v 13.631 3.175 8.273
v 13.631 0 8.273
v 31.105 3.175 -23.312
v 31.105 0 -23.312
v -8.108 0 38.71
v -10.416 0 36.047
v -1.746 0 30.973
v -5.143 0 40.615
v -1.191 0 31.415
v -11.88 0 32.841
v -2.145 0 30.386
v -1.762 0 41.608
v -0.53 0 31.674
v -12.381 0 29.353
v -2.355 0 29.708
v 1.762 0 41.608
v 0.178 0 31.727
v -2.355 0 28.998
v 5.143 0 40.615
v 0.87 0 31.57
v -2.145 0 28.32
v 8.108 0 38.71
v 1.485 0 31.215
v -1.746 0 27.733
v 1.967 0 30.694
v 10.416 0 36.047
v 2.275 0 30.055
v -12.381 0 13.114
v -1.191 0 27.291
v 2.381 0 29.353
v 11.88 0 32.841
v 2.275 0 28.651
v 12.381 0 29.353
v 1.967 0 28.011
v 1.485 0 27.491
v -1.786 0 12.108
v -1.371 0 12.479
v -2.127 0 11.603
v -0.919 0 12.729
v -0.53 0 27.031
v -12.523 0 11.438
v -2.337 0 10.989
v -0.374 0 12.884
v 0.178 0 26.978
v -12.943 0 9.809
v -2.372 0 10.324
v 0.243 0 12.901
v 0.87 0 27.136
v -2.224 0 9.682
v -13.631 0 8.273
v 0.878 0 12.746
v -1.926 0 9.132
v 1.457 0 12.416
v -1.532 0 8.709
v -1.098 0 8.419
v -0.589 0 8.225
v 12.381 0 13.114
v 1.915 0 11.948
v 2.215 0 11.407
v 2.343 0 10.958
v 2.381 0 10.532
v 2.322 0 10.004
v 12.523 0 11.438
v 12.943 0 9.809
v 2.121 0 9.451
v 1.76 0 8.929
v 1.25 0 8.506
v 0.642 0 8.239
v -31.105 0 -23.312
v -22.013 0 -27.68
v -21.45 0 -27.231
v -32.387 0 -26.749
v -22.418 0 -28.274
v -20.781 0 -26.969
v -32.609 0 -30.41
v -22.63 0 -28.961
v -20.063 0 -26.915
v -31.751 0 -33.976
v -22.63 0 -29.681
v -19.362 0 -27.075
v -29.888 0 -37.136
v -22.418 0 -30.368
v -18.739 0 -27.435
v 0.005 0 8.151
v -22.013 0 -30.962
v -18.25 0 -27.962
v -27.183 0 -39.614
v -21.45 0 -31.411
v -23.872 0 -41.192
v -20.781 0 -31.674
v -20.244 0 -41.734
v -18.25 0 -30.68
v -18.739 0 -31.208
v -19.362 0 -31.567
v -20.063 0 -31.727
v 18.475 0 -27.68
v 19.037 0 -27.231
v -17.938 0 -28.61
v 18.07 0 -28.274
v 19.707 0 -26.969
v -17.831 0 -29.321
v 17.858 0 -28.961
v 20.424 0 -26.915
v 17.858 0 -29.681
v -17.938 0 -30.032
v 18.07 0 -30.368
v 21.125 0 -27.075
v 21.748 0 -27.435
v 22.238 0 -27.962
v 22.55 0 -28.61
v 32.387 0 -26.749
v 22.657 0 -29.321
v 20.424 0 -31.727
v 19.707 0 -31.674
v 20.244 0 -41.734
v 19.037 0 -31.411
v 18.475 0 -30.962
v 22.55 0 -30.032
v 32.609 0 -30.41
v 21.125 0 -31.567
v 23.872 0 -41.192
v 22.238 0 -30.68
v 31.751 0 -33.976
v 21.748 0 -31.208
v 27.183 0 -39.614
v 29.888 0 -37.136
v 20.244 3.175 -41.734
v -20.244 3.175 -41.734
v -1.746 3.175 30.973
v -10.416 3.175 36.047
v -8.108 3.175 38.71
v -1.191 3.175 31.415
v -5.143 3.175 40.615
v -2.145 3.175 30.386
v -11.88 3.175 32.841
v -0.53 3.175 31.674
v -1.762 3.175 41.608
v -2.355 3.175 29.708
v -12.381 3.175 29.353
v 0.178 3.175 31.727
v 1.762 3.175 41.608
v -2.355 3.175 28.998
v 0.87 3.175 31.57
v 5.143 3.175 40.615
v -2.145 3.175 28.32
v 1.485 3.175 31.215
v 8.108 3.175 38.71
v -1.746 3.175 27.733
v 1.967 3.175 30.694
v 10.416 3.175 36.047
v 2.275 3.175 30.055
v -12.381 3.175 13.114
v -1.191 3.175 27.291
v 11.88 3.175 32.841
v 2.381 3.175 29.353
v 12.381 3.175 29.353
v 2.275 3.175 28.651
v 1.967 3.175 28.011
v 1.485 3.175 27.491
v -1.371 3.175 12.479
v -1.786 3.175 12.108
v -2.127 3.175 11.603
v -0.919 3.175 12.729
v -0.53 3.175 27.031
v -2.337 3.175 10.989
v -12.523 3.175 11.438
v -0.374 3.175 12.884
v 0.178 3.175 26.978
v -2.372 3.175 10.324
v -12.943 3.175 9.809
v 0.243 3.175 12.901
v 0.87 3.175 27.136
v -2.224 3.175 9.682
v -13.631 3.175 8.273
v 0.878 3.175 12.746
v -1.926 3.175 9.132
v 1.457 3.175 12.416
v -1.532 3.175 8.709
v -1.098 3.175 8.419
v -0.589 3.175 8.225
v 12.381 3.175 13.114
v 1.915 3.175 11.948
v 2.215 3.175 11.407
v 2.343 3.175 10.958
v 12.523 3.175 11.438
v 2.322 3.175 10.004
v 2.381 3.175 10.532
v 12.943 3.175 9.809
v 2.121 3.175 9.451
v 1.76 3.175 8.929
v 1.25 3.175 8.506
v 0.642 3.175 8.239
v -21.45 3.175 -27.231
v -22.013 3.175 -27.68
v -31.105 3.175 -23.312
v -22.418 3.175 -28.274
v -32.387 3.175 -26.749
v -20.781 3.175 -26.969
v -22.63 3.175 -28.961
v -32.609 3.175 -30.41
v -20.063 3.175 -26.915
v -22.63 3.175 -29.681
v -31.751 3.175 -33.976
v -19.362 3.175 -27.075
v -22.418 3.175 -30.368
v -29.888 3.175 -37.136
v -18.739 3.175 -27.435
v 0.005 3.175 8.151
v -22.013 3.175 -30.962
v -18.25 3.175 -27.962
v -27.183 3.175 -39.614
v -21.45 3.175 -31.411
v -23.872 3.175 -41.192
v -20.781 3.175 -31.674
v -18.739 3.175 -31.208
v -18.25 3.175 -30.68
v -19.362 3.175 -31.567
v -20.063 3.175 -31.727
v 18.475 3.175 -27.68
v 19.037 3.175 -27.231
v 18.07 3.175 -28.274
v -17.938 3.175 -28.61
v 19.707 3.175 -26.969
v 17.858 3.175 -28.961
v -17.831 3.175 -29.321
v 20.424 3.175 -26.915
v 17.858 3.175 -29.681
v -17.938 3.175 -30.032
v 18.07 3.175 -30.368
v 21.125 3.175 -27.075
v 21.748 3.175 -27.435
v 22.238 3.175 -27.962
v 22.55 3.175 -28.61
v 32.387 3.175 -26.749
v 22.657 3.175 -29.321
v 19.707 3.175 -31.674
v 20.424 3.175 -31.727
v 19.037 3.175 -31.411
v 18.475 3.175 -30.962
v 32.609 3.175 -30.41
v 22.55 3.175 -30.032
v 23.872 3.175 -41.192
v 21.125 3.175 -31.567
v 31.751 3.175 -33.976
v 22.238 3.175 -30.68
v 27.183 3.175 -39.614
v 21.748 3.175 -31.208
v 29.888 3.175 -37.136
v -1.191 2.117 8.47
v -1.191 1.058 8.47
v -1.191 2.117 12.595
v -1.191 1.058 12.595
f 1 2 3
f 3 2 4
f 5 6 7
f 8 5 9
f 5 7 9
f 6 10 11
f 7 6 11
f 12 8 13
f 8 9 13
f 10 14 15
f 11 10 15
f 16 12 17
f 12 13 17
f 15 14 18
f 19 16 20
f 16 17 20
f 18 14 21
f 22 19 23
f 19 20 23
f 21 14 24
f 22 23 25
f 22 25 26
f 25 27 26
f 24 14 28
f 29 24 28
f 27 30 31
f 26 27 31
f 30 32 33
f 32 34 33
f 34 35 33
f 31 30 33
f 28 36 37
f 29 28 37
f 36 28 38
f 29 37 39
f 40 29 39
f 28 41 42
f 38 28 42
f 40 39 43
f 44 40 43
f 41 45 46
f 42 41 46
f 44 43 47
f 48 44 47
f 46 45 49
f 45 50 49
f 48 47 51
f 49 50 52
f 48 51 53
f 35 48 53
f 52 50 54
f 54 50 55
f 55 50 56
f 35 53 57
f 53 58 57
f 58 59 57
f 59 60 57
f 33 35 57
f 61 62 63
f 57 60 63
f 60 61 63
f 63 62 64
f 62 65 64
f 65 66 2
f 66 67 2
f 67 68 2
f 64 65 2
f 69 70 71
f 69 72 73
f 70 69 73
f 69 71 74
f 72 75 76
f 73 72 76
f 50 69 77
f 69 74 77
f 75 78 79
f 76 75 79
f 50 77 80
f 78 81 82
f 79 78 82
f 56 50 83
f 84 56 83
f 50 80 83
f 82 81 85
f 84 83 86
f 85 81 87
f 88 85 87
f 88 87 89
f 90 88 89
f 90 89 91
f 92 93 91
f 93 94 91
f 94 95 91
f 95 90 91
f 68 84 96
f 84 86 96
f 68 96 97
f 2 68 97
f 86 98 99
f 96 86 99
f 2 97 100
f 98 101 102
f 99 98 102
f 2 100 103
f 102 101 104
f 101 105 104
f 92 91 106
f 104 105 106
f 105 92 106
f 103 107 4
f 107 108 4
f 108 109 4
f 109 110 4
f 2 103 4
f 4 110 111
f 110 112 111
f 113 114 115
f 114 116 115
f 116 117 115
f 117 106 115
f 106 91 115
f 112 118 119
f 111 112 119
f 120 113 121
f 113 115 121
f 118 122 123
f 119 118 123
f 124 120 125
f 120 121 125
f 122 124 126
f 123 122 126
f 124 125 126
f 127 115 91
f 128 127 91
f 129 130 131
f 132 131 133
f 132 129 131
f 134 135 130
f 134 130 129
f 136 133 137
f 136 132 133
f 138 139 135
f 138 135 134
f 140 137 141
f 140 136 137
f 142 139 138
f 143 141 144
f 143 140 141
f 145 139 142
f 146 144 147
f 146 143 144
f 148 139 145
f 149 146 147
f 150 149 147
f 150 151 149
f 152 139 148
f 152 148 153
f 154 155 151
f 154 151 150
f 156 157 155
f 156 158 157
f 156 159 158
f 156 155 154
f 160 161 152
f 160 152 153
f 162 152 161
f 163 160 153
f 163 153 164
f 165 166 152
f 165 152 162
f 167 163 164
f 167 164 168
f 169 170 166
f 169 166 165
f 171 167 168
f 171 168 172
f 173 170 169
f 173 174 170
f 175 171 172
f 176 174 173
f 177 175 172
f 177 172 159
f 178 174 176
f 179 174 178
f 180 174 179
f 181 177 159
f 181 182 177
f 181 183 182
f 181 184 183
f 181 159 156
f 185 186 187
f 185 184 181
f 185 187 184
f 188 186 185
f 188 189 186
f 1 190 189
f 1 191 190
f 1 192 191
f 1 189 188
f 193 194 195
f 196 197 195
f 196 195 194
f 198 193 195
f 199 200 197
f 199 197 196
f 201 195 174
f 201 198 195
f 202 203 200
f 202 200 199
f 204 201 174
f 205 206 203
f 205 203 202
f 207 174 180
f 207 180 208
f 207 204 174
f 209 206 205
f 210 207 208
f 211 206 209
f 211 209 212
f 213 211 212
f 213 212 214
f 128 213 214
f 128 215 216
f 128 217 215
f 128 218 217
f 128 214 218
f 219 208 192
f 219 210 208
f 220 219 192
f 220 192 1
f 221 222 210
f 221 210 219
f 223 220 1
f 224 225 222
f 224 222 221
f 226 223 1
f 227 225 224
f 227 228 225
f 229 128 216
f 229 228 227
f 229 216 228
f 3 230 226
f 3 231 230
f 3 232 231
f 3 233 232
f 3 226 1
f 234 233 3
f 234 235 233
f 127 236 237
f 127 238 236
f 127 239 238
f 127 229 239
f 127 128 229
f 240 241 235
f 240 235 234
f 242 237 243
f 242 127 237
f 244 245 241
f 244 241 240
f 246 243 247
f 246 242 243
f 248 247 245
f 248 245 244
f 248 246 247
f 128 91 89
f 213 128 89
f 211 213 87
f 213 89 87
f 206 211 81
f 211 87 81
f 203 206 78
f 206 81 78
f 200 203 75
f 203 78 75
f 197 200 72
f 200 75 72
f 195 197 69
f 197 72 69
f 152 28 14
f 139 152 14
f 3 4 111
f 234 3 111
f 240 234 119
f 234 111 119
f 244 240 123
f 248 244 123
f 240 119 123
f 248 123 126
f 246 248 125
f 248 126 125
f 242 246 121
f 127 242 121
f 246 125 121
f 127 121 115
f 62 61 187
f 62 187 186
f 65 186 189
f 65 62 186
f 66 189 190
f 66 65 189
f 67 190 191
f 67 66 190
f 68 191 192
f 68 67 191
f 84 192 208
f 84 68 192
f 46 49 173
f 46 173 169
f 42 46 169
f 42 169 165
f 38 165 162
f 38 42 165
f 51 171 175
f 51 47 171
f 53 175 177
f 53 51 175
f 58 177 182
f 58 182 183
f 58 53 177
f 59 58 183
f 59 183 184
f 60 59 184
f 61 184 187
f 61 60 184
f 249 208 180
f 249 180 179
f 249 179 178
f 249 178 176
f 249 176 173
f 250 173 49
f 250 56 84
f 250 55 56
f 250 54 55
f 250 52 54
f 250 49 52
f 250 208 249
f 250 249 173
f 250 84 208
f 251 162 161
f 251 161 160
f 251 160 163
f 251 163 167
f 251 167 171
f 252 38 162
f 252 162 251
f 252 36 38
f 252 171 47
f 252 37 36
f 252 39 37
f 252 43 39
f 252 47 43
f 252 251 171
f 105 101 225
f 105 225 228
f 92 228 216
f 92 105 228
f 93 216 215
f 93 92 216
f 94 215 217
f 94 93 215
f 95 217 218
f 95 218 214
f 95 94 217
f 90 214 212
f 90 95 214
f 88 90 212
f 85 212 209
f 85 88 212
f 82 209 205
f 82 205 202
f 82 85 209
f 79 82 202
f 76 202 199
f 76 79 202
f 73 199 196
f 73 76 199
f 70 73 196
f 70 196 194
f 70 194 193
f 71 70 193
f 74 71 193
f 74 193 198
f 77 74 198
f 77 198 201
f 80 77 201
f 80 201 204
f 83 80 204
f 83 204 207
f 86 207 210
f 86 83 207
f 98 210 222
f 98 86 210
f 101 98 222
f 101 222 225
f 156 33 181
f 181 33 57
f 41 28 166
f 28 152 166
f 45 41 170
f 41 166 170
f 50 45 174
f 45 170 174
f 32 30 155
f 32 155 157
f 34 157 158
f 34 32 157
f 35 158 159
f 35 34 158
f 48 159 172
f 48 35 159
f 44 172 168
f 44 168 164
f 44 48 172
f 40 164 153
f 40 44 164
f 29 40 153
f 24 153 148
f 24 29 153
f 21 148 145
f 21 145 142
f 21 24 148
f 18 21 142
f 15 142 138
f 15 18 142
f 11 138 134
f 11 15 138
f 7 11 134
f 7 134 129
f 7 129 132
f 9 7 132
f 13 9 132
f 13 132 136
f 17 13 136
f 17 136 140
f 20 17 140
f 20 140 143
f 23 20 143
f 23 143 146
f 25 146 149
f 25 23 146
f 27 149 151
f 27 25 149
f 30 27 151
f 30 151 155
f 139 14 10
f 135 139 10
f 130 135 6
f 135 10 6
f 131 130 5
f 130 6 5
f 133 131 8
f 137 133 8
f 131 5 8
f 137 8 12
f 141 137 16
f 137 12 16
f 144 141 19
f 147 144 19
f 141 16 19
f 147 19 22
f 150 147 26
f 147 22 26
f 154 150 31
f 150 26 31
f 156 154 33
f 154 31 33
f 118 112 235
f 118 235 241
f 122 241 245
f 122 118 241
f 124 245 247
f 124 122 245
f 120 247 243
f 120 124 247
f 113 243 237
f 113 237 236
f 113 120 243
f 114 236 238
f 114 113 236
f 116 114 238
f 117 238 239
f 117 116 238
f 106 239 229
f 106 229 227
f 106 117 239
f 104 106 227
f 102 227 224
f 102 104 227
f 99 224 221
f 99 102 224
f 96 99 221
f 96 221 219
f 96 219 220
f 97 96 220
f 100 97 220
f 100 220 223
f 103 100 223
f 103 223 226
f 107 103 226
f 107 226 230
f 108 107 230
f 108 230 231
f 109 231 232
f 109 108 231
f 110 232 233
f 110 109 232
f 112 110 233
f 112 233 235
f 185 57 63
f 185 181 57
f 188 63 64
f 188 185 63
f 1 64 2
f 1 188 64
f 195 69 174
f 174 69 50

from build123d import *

# Parameters (mm, degrees)
SKETCH1_R           = 2.38125
SKETCH1_R_2         = 12.413
SKETCH1_R_3         = 2.413
BOSS_EXTRUDE1_DEPTH = 3.175
FILLET1_R           = 10


with BuildPart() as part:
    # Sketch1 → Boss-Extrude1 (new body)
    with BuildSketch(Plane(origin=(0, 0, 0), x_dir=(1, 0, 0), z_dir=(0, 1, 0))):
        with BuildLine():
            ThreePointArc((-8.046041628, -19.942425209), (-11.245341357, -24.172368354), (-12.38125, -29.352875022))
            ThreePointArc((-12.38125, -29.352875022), (0, -41.734125022), (12.38125, -29.352875022))
            ThreePointArc((12.38125, -29.352875022), (11.245341357, -24.172368354), (8.046041628, -19.942425209))
            add(Edge.make_bspline(
                [(-8.046041628, -19.942425209), (-7.058484548, -20.785974262), (-4.539606647, -22.332996604), (0, -23.235965205), (4.539606647, -22.332996604), (7.058484548, -20.785974262), (8.046041628, -19.942425209)],
                knots=[4.00497242, 4.00497242, 4.00497242, 4.00497242, 4.319689899, 4.71238898, 5.105088062, 5.419805541, 5.419805541, 5.419805541, 5.419805541], degree=3))
        make_face()
        with Locations((0, -29.352875022)):
            Circle(SKETCH1_R, mode=Mode.SUBTRACT)
        with BuildLine():
            Line((-12.38125, -10.532423695), (-12.38125, -29.352875022))
            ThreePointArc((-12.38125, -29.352875022), (-11.245341357, -24.172368354), (-8.046041628, -19.942425209))
            add(Edge.make_bspline(
                [(-12.38125, -10.532423695), (-12.38125, -10.937602676), (-12.301779915, -12.5583186), (-11.507079063, -15.737360854), (-9.718393414, -18.414272732), (-8.290741365, -19.733408195), (-8.046041628, -19.942425209)],
                knots=[3.141592654, 3.141592654, 3.141592654, 3.141592654, 3.239767424, 3.534291735, 3.926990817, 4.00497242, 4.00497242, 4.00497242, 4.00497242], degree=3))
        make_face()
        with BuildLine():
            ThreePointArc((8.046041628, -19.942425209), (0, -16.971625022), (-8.046041628, -19.942425209))
            add(Edge.make_bspline(
                [(-8.046041628, -19.942425209), (-7.058484548, -20.785974262), (-4.539606647, -22.332996604), (0, -23.235965205), (4.539606647, -22.332996604), (7.058484548, -20.785974262), (8.046041628, -19.942425209)],
                knots=[4.00497242, 4.00497242, 4.00497242, 4.00497242, 4.319689899, 4.71238898, 5.105088062, 5.419805541, 5.419805541, 5.419805541, 5.419805541], degree=3))
        make_face()
        with BuildLine():
            ThreePointArc((8.046041628, -19.942425209), (11.245341357, -24.172368354), (12.38125, -29.352875022))
            Line((12.38125, -29.352875022), (12.38125, -10.532423695))
            add(Edge.make_bspline(
                [(8.046041628, -19.942425209), (8.290741365, -19.733408195), (9.718393414, -18.414272732), (11.736565023, -15.393916665), (12.38125, -12.152921351), (12.38125, -10.532423695)],
                knots=[5.419805541, 5.419805541, 5.419805541, 5.419805541, 5.497787144, 5.890486225, 6.283185307, 6.283185307, 6.283185307, 6.283185307], degree=3))
        make_face()
        with BuildLine():
            add(Edge.make_bspline(
                [(12.38125, -10.532423695), (12.38125, -8.911926038), (11.736565023, -5.670930724), (8.982733505, -1.549600459), (4.861396275, 1.204142363), (0, 2.171117815), (-4.861396275, 1.204142363), (-8.982733505, -1.549600459), (-11.507079063, -5.327486536), (-12.301779915, -8.506528789), (-12.38125, -10.127244714), (-12.38125, -10.532423695)],
                knots=[0, 0, 0, 0, 0.392699082, 0.785398163, 1.178097245, 1.570796327, 1.963495408, 2.35619449, 2.748893572, 3.043417883, 3.141592654, 3.141592654, 3.141592654, 3.141592654], degree=3))
            add(Edge.make_bspline(
                [(-12.38125, -10.532423695), (-12.38125, -10.937602676), (-12.301779915, -12.5583186), (-11.507079063, -15.737360854), (-9.718393414, -18.414272732), (-8.290741365, -19.733408195), (-8.046041628, -19.942425209)],
                knots=[3.141592654, 3.141592654, 3.141592654, 3.141592654, 3.239767424, 3.534291735, 3.926990817, 4.00497242, 4.00497242, 4.00497242, 4.00497242], degree=3))
            ThreePointArc((-8.046041628, -19.942425209), (0, -16.971625022), (8.046041628, -19.942425209))
            add(Edge.make_bspline(
                [(8.046041628, -19.942425209), (8.290741365, -19.733408195), (9.718393414, -18.414272732), (11.736565023, -15.393916665), (12.38125, -12.152921351), (12.38125, -10.532423695)],
                knots=[5.419805541, 5.419805541, 5.419805541, 5.419805541, 5.497787144, 5.890486225, 6.283185307, 6.283185307, 6.283185307, 6.283185307], degree=3))
        make_face()
        with BuildLine():
            add(Edge.make_bspline(
                [(2.38125, -10.532423695), (2.38125, -6.408035977), (-1.190625, -8.470229836), (-4.7625, -10.532423695), (-1.190625, -12.594617554), (2.38125, -14.656811413), (2.38125, -10.532423695)],
                knots=[0, 0, 0, 2.094395102, 2.094395102, 4.188790205, 4.188790205, 6.283185307, 6.283185307, 6.283185307], degree=2, weights=[1, 0.5, 1, 0.5, 1, 0.5, 1]))
        make_face(mode=Mode.SUBTRACT)
        with BuildLine():
            Line((-31.105374648, 23.312068051), (-12.38125, -10.532423695))
            add(Edge.make_bspline(
                [(12.38125, -10.532423695), (12.38125, -8.911926038), (11.736565023, -5.670930724), (8.982733505, -1.549600459), (4.861396275, 1.204142363), (0, 2.171117815), (-4.861396275, 1.204142363), (-8.982733505, -1.549600459), (-11.507079063, -5.327486536), (-12.301779915, -8.506528789), (-12.38125, -10.127244714), (-12.38125, -10.532423695)],
                knots=[0, 0, 0, 0, 0.392699082, 0.785398163, 1.178097245, 1.570796327, 1.963495408, 2.35619449, 2.748893572, 3.043417883, 3.141592654, 3.141592654, 3.141592654, 3.141592654], degree=3))
            Line((12.38125, -10.532423695), (31.105374628, 23.312068057))
            ThreePointArc((31.105374628, 23.312068057), (9.550975447, 23.016676344), (20.2438, 41.734124978))
            Line((20.2438, 41.734124978), (-20.2438, 41.734124978))
            ThreePointArc((-20.2438, 41.734124978), (-11.466483525, 38.098441453), (-7.8308, 29.321124978))
            ThreePointArc((-7.8308, 29.321124978), (-17.140749655, 17.302237861), (-31.105374648, 23.312068051))
        make_face()
        with Locations((20.243799976, 29.321124978)):
            Circle(SKETCH1_R_2)
        with Locations((20.2438, 29.321125022)):
            Circle(SKETCH1_R_3, mode=Mode.SUBTRACT)
        with Locations((-20.2438, 29.321124978)):
            Circle(SKETCH1_R_2)
        with Locations((-20.2438, 29.321124978)):
            Circle(SKETCH1_R_3, mode=Mode.SUBTRACT)
    extrude(amount=BOSS_EXTRUDE1_DEPTH)

    # Fillet1
    fillet1_edges = [part.edges().sort_by_distance(p)[0] for p in [
        (-12.38125, 1.5875, 10.532423695),
        (12.38125, 1.5875, 10.532423695),
    ]]
    fillet(fillet1_edges, radius=FILLET1_R)


solid = part.part
